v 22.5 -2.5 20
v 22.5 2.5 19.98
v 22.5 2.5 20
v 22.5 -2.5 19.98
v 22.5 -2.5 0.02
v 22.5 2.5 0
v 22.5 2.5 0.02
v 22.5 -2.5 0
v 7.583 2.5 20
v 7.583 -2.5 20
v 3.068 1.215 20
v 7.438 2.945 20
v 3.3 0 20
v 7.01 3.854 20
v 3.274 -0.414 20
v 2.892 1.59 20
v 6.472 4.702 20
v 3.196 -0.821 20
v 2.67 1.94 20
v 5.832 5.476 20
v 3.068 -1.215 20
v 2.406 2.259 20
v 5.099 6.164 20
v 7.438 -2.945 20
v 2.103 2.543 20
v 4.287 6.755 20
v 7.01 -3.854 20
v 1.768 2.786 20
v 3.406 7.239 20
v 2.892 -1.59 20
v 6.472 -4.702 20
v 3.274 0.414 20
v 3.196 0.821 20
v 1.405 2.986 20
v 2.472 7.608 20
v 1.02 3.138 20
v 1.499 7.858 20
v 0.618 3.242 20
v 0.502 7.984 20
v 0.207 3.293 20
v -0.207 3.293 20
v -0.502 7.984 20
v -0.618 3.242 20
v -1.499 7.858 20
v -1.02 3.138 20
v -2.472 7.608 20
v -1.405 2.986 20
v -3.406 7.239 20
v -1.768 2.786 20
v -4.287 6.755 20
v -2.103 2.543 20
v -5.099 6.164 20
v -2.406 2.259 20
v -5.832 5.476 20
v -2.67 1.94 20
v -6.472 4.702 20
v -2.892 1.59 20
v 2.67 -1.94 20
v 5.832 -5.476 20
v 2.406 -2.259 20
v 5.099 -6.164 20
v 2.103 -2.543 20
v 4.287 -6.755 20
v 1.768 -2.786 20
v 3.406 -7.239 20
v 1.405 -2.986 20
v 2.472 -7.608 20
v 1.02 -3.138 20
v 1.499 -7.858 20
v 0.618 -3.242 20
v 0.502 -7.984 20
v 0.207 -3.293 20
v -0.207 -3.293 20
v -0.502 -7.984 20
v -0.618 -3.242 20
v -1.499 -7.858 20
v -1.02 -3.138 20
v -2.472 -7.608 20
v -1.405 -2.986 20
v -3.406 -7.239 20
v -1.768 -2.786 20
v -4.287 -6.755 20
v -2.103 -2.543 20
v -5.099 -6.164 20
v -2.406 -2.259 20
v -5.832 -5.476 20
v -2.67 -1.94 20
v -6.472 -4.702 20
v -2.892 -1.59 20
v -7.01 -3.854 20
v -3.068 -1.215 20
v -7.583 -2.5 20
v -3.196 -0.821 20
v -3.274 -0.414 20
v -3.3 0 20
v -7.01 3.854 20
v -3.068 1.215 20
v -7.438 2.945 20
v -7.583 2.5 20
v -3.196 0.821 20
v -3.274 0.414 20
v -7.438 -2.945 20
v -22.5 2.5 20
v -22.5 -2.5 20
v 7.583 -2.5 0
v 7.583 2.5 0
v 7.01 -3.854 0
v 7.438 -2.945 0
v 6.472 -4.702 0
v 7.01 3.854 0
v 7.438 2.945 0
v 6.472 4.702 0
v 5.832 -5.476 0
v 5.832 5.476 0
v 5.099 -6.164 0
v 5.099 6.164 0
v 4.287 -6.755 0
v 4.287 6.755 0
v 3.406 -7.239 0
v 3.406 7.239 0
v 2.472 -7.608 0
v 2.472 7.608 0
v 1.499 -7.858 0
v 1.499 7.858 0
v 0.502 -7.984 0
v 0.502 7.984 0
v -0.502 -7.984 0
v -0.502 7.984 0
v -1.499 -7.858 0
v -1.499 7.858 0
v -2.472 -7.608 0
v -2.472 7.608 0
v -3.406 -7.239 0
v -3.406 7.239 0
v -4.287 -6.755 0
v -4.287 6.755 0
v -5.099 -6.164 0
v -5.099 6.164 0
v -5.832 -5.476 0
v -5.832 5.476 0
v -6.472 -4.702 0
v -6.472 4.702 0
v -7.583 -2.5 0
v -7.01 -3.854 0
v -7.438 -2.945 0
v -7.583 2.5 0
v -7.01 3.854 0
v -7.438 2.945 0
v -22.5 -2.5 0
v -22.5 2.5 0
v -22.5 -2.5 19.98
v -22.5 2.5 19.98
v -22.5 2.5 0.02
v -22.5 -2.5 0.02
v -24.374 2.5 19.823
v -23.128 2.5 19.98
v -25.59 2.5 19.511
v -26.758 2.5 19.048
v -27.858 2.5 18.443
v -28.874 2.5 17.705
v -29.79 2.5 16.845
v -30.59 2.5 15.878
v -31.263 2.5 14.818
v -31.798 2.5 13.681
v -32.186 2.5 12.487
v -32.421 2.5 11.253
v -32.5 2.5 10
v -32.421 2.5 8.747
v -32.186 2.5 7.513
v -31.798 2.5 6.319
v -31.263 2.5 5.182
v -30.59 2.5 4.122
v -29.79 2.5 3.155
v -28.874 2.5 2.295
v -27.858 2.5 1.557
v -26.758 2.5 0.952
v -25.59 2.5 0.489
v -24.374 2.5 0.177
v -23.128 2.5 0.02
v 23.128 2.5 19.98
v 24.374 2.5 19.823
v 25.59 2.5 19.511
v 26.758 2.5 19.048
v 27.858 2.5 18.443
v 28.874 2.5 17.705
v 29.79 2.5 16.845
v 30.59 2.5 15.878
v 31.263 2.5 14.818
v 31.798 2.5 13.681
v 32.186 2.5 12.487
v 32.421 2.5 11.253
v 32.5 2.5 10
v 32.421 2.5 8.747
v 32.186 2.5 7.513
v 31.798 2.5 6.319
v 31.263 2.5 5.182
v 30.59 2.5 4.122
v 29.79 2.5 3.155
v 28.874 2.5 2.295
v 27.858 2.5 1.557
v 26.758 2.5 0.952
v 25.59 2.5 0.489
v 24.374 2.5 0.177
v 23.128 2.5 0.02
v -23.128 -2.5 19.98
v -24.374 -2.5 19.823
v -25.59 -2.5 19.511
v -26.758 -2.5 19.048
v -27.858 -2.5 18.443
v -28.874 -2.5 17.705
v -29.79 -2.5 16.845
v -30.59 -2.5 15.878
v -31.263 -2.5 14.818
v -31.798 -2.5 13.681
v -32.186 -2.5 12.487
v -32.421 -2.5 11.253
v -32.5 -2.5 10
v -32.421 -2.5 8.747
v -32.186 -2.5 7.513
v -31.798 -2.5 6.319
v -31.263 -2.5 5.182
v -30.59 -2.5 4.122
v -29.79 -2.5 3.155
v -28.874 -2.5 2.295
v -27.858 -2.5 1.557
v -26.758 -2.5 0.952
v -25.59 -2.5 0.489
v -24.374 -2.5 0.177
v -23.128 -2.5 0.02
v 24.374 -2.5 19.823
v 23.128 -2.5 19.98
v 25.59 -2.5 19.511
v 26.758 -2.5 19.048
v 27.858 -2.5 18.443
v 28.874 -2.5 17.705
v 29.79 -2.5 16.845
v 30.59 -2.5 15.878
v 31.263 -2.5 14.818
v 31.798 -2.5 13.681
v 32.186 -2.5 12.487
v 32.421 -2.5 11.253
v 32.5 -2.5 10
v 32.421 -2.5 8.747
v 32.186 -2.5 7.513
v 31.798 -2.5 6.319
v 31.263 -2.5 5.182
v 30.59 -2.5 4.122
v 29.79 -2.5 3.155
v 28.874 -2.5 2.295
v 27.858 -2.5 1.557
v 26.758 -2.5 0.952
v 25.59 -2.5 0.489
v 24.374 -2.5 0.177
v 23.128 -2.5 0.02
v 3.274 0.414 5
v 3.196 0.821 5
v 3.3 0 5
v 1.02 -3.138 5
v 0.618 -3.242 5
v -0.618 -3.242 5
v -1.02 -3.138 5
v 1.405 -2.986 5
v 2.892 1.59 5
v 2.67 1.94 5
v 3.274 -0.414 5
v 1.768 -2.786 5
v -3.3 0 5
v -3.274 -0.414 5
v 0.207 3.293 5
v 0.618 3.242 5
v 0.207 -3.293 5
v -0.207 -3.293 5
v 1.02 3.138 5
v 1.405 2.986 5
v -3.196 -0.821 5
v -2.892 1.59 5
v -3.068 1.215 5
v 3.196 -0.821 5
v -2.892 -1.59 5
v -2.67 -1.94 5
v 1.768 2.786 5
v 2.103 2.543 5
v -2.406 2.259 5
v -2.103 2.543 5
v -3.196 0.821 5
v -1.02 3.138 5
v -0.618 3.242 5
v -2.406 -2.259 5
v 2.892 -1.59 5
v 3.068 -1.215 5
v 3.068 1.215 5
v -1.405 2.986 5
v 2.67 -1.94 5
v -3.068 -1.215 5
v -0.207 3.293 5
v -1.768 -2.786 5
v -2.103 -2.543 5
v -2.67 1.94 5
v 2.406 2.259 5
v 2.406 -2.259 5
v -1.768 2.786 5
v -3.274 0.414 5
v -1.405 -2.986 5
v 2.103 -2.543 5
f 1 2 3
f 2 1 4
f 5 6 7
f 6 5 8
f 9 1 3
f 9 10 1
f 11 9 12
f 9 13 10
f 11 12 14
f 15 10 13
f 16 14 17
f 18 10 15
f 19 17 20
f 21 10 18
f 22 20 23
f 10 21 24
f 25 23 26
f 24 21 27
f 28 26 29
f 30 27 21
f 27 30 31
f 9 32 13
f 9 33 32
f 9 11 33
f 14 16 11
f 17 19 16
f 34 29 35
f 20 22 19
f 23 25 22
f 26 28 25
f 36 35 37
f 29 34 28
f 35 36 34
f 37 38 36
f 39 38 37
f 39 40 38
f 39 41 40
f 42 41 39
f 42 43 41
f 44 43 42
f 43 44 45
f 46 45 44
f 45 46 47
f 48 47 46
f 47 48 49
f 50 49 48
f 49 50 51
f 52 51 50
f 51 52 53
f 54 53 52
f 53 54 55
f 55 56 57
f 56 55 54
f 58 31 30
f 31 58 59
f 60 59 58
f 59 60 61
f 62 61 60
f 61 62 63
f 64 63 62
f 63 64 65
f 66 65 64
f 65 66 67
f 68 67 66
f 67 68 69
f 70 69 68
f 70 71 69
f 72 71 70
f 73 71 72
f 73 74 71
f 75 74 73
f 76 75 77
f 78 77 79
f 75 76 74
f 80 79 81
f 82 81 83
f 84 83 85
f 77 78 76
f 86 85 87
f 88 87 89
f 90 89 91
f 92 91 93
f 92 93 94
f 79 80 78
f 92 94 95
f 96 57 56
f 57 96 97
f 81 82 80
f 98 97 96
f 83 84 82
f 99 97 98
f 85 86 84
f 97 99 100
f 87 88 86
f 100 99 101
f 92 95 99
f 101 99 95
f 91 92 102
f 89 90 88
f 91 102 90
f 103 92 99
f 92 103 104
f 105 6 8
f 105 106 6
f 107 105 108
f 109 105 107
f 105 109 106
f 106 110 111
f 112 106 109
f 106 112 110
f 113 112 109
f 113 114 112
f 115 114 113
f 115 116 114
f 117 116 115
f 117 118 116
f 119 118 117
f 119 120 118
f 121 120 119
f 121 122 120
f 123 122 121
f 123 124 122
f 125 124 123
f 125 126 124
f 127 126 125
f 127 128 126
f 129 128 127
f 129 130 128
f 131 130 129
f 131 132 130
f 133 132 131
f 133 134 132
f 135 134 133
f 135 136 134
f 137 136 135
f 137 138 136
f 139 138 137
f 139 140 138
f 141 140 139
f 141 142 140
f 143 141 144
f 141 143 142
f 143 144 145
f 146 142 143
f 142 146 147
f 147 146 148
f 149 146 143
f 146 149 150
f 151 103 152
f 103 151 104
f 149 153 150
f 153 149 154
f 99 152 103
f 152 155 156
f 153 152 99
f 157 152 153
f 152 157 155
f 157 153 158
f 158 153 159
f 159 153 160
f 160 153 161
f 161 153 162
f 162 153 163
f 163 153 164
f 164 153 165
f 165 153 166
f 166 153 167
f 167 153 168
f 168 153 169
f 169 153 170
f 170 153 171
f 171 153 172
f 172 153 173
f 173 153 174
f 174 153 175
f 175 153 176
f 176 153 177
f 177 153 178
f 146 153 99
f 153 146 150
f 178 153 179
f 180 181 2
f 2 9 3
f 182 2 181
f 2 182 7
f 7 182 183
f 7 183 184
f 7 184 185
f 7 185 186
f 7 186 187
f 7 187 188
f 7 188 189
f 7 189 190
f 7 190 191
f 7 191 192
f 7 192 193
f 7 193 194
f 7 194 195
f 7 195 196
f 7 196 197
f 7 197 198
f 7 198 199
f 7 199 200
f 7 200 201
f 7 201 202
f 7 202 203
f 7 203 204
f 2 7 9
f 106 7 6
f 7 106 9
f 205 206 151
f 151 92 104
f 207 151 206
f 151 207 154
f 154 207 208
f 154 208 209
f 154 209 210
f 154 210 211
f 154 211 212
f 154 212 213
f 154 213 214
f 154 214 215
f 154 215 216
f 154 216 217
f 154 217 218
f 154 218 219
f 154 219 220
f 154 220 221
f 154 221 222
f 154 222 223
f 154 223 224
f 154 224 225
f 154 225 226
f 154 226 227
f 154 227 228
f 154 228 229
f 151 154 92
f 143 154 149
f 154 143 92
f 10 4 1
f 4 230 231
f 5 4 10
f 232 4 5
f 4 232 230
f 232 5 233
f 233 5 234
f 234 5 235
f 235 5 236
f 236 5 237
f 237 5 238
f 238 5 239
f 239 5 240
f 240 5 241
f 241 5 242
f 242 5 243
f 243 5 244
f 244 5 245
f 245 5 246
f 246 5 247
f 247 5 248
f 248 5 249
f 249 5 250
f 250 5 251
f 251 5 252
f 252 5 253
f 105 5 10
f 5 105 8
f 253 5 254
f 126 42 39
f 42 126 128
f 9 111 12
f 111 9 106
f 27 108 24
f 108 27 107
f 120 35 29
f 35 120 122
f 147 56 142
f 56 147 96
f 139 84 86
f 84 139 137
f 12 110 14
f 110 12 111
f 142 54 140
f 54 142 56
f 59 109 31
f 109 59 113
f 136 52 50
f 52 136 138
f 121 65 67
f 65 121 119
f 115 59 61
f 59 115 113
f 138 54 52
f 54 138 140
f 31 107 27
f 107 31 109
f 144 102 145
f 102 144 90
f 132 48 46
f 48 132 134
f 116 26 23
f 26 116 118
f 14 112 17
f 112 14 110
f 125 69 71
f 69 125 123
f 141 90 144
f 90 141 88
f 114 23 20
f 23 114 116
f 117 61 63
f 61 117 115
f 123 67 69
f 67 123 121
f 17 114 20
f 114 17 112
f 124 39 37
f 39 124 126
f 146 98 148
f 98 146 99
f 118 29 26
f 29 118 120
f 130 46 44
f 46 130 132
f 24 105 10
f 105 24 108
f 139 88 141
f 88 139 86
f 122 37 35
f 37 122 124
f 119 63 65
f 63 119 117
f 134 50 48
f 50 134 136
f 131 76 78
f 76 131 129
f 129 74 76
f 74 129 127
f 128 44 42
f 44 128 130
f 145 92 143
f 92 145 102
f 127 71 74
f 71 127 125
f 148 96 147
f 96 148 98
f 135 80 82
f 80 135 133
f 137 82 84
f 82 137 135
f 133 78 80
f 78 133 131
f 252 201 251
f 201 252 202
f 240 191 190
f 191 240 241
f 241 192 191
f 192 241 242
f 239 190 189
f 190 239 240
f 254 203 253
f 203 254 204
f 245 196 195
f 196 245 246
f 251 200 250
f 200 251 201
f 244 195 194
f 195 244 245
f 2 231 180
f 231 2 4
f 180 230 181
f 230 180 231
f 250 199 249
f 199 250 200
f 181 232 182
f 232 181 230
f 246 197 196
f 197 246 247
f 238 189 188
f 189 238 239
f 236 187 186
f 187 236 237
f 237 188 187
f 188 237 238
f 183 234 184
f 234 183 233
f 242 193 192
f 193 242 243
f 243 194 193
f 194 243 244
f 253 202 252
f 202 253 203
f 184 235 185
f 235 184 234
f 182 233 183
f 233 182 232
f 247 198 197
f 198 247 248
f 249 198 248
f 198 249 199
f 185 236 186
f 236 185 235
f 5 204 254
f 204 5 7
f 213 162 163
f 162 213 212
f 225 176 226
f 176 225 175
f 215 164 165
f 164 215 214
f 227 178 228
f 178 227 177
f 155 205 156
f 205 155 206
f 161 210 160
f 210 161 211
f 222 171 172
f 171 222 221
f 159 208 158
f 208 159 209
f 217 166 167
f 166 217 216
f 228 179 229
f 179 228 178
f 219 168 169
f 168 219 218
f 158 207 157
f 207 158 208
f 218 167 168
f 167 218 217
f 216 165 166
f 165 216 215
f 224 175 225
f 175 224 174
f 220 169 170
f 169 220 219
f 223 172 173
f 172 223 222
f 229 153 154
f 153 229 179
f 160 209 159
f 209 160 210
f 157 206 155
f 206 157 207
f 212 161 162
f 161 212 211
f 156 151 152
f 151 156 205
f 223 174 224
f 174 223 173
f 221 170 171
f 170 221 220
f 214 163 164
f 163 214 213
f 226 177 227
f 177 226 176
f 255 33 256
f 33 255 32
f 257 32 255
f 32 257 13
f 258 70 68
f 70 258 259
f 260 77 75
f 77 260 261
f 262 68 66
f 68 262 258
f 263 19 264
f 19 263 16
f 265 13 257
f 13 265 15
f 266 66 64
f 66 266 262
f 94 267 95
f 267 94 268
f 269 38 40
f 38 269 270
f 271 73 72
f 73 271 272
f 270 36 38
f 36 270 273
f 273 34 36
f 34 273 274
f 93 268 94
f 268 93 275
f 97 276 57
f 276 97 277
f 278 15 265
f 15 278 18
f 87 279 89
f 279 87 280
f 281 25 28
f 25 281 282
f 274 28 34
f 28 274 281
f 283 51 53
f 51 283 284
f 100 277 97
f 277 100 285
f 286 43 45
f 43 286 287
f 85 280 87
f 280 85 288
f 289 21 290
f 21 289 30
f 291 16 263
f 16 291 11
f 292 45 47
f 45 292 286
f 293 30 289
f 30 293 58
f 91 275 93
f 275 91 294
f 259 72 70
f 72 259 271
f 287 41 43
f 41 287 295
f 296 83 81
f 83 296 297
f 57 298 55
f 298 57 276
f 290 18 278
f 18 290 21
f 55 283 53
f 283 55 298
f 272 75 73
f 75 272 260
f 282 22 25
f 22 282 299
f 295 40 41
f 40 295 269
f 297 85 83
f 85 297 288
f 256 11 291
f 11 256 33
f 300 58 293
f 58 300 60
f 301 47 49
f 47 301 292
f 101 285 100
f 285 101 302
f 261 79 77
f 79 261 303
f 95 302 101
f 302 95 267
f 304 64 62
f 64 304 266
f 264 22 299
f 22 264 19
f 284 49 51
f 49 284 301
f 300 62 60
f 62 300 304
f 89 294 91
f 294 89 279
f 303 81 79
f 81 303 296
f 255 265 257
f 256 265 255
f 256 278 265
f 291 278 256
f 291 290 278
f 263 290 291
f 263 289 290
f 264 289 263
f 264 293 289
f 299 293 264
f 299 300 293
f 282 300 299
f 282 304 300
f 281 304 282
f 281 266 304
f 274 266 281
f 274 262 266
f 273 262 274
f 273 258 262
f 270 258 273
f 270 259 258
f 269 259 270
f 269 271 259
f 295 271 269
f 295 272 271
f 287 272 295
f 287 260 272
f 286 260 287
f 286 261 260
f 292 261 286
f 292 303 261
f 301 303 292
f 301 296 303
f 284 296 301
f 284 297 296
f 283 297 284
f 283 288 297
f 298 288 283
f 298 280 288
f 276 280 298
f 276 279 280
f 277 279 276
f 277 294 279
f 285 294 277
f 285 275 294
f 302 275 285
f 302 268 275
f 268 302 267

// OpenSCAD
h = 20;
hi = 5;
ri = 3.3;
ra = 8;

$fn = 50; 

bc = 45;
dc = 5;

difference(){
	union(){
		translate([0,0,h/2])cube([bc,dc,h],center=true);
		cylinder(h=h,r=ra);
		translate([bc/2,0,h/2]) rotate([90,0,0]) cylinder(h=dc,r=h/2,center=true);
		translate([-bc/2,0,h/2]) rotate([90,0,0]) cylinder(h=dc,r=h/2,center=true);
	}
	translate([0,0,hi]) cylinder(h=h,r=ri);
}
